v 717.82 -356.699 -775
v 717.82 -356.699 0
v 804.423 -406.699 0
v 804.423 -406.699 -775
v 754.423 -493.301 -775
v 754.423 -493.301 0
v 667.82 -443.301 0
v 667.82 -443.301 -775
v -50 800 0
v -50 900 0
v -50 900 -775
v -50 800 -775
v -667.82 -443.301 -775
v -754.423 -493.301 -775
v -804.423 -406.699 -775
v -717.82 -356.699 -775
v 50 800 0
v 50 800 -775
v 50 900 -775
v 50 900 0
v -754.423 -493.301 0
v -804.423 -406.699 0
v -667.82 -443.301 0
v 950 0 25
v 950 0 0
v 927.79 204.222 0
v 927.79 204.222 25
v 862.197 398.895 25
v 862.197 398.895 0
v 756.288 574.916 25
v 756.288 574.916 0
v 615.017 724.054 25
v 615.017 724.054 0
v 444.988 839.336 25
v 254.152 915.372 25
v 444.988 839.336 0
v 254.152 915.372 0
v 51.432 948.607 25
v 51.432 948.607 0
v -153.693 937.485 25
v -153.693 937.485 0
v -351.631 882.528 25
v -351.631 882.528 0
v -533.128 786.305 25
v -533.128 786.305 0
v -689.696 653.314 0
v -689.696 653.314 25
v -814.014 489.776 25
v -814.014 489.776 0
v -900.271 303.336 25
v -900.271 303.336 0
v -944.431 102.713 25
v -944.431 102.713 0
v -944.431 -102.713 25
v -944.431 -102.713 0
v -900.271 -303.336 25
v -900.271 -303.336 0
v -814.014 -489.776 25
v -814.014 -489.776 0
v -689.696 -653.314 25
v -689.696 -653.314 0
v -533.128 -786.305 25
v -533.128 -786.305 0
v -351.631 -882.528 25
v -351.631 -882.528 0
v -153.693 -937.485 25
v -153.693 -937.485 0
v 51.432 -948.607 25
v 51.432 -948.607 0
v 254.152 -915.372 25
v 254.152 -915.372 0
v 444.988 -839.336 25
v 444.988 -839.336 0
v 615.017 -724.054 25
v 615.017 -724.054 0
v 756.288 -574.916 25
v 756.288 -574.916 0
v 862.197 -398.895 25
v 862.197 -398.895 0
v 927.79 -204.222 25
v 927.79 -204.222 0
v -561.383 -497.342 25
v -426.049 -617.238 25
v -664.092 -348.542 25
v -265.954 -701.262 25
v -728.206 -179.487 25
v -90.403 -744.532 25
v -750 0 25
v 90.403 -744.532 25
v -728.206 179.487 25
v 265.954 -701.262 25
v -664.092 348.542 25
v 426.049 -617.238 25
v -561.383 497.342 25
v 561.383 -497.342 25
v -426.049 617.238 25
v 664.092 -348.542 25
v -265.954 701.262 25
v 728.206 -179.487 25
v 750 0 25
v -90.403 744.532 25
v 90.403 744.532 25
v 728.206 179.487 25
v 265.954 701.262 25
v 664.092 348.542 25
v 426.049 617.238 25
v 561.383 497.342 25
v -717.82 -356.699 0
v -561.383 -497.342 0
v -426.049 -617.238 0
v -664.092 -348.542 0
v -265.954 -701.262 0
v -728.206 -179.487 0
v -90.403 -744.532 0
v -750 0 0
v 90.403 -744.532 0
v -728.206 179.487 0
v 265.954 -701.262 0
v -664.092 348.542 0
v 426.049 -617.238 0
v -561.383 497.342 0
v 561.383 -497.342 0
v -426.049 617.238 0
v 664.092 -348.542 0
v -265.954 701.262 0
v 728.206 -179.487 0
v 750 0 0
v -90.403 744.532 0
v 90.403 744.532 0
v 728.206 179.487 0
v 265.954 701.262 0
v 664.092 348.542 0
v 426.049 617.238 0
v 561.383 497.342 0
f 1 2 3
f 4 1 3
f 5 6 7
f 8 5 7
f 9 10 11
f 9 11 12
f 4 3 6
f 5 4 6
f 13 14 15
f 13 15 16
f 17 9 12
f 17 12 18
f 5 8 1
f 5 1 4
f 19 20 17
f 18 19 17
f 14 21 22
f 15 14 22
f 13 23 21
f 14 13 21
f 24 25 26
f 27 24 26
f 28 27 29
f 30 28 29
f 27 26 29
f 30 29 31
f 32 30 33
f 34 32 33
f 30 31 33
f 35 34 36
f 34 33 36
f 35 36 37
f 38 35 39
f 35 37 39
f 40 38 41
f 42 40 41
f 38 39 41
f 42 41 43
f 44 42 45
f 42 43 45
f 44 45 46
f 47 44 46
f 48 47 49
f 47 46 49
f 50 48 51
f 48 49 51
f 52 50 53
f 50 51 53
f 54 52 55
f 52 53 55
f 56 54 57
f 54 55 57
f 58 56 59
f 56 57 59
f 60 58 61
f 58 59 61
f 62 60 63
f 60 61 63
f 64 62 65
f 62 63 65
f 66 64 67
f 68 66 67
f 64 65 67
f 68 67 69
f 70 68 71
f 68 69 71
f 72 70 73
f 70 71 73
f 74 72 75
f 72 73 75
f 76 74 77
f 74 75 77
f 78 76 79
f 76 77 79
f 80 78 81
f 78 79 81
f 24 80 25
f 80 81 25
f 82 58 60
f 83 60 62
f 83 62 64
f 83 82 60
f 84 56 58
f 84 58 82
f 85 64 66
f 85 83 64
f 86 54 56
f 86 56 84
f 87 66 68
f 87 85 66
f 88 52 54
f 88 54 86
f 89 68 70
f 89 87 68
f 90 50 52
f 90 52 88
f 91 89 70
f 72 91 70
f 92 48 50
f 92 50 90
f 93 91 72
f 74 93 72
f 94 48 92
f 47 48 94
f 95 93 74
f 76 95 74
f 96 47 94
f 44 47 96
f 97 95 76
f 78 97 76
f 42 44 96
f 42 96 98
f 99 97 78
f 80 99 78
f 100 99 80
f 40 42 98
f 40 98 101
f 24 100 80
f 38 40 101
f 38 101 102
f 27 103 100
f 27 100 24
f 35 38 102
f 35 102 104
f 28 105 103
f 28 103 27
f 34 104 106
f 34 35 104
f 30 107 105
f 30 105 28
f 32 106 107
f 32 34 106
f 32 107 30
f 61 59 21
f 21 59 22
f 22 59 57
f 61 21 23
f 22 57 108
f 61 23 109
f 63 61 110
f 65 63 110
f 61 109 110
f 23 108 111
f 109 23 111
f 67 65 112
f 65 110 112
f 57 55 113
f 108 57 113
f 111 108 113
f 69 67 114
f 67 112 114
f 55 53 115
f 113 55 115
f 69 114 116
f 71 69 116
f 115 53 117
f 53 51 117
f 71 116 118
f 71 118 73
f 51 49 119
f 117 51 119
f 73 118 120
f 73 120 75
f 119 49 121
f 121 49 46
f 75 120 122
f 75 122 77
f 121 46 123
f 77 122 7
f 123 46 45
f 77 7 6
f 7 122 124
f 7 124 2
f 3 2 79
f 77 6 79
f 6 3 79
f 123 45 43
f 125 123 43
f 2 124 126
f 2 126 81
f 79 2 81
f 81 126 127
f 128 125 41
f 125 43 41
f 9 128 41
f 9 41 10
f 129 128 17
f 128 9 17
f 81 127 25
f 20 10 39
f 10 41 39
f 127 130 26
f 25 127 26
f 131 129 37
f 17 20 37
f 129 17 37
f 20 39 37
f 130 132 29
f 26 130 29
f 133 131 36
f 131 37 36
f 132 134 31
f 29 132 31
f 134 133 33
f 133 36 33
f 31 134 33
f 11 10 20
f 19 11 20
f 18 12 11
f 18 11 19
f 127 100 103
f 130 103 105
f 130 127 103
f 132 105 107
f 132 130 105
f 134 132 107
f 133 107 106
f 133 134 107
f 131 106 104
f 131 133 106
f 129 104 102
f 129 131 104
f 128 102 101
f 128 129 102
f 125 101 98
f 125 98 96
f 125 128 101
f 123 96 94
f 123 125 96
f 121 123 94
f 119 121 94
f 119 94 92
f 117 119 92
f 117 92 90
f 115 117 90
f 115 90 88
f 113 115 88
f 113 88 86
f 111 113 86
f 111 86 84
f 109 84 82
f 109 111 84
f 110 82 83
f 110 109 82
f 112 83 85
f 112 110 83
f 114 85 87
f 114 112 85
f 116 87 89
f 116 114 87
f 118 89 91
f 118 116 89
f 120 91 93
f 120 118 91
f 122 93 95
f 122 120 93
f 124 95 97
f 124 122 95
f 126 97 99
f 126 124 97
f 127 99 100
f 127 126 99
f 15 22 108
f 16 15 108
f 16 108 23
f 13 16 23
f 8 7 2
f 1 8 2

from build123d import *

# Parameters (mm, degrees)
F0_R     = 950
F0_R_2   = 750
F1_DEPTH = 25
F2_W     = 100
F2_H     = 100
F3_DEPTH = 775


with BuildPart() as f1:
    # F0 (on Top) → F1 (new body)
    with BuildSketch(Plane.XY):
        Circle(F0_R)
        Circle(F0_R_2, mode=Mode.SUBTRACT)
    extrude(amount=F1_DEPTH)

    # F2 (on face) → F3 (join)
    with BuildSketch(Plane(origin=(0, 0, 0), x_dir=(1, 0, 0), z_dir=(0, 0, -1))):
        with Locations((0, -850)):
            Rectangle(F2_W, F2_H)
        Polygon((-717.820323, 356.69873), (-667.820323, 443.30127), (-754.422863, 493.30127), (-804.422863, 406.69873), align=None)
        Polygon((667.820323, 443.30127), (717.820323, 356.69873), (804.422863, 406.69873), (754.422863, 493.30127), align=None)
    extrude(amount=F3_DEPTH)


solid = f1.part
